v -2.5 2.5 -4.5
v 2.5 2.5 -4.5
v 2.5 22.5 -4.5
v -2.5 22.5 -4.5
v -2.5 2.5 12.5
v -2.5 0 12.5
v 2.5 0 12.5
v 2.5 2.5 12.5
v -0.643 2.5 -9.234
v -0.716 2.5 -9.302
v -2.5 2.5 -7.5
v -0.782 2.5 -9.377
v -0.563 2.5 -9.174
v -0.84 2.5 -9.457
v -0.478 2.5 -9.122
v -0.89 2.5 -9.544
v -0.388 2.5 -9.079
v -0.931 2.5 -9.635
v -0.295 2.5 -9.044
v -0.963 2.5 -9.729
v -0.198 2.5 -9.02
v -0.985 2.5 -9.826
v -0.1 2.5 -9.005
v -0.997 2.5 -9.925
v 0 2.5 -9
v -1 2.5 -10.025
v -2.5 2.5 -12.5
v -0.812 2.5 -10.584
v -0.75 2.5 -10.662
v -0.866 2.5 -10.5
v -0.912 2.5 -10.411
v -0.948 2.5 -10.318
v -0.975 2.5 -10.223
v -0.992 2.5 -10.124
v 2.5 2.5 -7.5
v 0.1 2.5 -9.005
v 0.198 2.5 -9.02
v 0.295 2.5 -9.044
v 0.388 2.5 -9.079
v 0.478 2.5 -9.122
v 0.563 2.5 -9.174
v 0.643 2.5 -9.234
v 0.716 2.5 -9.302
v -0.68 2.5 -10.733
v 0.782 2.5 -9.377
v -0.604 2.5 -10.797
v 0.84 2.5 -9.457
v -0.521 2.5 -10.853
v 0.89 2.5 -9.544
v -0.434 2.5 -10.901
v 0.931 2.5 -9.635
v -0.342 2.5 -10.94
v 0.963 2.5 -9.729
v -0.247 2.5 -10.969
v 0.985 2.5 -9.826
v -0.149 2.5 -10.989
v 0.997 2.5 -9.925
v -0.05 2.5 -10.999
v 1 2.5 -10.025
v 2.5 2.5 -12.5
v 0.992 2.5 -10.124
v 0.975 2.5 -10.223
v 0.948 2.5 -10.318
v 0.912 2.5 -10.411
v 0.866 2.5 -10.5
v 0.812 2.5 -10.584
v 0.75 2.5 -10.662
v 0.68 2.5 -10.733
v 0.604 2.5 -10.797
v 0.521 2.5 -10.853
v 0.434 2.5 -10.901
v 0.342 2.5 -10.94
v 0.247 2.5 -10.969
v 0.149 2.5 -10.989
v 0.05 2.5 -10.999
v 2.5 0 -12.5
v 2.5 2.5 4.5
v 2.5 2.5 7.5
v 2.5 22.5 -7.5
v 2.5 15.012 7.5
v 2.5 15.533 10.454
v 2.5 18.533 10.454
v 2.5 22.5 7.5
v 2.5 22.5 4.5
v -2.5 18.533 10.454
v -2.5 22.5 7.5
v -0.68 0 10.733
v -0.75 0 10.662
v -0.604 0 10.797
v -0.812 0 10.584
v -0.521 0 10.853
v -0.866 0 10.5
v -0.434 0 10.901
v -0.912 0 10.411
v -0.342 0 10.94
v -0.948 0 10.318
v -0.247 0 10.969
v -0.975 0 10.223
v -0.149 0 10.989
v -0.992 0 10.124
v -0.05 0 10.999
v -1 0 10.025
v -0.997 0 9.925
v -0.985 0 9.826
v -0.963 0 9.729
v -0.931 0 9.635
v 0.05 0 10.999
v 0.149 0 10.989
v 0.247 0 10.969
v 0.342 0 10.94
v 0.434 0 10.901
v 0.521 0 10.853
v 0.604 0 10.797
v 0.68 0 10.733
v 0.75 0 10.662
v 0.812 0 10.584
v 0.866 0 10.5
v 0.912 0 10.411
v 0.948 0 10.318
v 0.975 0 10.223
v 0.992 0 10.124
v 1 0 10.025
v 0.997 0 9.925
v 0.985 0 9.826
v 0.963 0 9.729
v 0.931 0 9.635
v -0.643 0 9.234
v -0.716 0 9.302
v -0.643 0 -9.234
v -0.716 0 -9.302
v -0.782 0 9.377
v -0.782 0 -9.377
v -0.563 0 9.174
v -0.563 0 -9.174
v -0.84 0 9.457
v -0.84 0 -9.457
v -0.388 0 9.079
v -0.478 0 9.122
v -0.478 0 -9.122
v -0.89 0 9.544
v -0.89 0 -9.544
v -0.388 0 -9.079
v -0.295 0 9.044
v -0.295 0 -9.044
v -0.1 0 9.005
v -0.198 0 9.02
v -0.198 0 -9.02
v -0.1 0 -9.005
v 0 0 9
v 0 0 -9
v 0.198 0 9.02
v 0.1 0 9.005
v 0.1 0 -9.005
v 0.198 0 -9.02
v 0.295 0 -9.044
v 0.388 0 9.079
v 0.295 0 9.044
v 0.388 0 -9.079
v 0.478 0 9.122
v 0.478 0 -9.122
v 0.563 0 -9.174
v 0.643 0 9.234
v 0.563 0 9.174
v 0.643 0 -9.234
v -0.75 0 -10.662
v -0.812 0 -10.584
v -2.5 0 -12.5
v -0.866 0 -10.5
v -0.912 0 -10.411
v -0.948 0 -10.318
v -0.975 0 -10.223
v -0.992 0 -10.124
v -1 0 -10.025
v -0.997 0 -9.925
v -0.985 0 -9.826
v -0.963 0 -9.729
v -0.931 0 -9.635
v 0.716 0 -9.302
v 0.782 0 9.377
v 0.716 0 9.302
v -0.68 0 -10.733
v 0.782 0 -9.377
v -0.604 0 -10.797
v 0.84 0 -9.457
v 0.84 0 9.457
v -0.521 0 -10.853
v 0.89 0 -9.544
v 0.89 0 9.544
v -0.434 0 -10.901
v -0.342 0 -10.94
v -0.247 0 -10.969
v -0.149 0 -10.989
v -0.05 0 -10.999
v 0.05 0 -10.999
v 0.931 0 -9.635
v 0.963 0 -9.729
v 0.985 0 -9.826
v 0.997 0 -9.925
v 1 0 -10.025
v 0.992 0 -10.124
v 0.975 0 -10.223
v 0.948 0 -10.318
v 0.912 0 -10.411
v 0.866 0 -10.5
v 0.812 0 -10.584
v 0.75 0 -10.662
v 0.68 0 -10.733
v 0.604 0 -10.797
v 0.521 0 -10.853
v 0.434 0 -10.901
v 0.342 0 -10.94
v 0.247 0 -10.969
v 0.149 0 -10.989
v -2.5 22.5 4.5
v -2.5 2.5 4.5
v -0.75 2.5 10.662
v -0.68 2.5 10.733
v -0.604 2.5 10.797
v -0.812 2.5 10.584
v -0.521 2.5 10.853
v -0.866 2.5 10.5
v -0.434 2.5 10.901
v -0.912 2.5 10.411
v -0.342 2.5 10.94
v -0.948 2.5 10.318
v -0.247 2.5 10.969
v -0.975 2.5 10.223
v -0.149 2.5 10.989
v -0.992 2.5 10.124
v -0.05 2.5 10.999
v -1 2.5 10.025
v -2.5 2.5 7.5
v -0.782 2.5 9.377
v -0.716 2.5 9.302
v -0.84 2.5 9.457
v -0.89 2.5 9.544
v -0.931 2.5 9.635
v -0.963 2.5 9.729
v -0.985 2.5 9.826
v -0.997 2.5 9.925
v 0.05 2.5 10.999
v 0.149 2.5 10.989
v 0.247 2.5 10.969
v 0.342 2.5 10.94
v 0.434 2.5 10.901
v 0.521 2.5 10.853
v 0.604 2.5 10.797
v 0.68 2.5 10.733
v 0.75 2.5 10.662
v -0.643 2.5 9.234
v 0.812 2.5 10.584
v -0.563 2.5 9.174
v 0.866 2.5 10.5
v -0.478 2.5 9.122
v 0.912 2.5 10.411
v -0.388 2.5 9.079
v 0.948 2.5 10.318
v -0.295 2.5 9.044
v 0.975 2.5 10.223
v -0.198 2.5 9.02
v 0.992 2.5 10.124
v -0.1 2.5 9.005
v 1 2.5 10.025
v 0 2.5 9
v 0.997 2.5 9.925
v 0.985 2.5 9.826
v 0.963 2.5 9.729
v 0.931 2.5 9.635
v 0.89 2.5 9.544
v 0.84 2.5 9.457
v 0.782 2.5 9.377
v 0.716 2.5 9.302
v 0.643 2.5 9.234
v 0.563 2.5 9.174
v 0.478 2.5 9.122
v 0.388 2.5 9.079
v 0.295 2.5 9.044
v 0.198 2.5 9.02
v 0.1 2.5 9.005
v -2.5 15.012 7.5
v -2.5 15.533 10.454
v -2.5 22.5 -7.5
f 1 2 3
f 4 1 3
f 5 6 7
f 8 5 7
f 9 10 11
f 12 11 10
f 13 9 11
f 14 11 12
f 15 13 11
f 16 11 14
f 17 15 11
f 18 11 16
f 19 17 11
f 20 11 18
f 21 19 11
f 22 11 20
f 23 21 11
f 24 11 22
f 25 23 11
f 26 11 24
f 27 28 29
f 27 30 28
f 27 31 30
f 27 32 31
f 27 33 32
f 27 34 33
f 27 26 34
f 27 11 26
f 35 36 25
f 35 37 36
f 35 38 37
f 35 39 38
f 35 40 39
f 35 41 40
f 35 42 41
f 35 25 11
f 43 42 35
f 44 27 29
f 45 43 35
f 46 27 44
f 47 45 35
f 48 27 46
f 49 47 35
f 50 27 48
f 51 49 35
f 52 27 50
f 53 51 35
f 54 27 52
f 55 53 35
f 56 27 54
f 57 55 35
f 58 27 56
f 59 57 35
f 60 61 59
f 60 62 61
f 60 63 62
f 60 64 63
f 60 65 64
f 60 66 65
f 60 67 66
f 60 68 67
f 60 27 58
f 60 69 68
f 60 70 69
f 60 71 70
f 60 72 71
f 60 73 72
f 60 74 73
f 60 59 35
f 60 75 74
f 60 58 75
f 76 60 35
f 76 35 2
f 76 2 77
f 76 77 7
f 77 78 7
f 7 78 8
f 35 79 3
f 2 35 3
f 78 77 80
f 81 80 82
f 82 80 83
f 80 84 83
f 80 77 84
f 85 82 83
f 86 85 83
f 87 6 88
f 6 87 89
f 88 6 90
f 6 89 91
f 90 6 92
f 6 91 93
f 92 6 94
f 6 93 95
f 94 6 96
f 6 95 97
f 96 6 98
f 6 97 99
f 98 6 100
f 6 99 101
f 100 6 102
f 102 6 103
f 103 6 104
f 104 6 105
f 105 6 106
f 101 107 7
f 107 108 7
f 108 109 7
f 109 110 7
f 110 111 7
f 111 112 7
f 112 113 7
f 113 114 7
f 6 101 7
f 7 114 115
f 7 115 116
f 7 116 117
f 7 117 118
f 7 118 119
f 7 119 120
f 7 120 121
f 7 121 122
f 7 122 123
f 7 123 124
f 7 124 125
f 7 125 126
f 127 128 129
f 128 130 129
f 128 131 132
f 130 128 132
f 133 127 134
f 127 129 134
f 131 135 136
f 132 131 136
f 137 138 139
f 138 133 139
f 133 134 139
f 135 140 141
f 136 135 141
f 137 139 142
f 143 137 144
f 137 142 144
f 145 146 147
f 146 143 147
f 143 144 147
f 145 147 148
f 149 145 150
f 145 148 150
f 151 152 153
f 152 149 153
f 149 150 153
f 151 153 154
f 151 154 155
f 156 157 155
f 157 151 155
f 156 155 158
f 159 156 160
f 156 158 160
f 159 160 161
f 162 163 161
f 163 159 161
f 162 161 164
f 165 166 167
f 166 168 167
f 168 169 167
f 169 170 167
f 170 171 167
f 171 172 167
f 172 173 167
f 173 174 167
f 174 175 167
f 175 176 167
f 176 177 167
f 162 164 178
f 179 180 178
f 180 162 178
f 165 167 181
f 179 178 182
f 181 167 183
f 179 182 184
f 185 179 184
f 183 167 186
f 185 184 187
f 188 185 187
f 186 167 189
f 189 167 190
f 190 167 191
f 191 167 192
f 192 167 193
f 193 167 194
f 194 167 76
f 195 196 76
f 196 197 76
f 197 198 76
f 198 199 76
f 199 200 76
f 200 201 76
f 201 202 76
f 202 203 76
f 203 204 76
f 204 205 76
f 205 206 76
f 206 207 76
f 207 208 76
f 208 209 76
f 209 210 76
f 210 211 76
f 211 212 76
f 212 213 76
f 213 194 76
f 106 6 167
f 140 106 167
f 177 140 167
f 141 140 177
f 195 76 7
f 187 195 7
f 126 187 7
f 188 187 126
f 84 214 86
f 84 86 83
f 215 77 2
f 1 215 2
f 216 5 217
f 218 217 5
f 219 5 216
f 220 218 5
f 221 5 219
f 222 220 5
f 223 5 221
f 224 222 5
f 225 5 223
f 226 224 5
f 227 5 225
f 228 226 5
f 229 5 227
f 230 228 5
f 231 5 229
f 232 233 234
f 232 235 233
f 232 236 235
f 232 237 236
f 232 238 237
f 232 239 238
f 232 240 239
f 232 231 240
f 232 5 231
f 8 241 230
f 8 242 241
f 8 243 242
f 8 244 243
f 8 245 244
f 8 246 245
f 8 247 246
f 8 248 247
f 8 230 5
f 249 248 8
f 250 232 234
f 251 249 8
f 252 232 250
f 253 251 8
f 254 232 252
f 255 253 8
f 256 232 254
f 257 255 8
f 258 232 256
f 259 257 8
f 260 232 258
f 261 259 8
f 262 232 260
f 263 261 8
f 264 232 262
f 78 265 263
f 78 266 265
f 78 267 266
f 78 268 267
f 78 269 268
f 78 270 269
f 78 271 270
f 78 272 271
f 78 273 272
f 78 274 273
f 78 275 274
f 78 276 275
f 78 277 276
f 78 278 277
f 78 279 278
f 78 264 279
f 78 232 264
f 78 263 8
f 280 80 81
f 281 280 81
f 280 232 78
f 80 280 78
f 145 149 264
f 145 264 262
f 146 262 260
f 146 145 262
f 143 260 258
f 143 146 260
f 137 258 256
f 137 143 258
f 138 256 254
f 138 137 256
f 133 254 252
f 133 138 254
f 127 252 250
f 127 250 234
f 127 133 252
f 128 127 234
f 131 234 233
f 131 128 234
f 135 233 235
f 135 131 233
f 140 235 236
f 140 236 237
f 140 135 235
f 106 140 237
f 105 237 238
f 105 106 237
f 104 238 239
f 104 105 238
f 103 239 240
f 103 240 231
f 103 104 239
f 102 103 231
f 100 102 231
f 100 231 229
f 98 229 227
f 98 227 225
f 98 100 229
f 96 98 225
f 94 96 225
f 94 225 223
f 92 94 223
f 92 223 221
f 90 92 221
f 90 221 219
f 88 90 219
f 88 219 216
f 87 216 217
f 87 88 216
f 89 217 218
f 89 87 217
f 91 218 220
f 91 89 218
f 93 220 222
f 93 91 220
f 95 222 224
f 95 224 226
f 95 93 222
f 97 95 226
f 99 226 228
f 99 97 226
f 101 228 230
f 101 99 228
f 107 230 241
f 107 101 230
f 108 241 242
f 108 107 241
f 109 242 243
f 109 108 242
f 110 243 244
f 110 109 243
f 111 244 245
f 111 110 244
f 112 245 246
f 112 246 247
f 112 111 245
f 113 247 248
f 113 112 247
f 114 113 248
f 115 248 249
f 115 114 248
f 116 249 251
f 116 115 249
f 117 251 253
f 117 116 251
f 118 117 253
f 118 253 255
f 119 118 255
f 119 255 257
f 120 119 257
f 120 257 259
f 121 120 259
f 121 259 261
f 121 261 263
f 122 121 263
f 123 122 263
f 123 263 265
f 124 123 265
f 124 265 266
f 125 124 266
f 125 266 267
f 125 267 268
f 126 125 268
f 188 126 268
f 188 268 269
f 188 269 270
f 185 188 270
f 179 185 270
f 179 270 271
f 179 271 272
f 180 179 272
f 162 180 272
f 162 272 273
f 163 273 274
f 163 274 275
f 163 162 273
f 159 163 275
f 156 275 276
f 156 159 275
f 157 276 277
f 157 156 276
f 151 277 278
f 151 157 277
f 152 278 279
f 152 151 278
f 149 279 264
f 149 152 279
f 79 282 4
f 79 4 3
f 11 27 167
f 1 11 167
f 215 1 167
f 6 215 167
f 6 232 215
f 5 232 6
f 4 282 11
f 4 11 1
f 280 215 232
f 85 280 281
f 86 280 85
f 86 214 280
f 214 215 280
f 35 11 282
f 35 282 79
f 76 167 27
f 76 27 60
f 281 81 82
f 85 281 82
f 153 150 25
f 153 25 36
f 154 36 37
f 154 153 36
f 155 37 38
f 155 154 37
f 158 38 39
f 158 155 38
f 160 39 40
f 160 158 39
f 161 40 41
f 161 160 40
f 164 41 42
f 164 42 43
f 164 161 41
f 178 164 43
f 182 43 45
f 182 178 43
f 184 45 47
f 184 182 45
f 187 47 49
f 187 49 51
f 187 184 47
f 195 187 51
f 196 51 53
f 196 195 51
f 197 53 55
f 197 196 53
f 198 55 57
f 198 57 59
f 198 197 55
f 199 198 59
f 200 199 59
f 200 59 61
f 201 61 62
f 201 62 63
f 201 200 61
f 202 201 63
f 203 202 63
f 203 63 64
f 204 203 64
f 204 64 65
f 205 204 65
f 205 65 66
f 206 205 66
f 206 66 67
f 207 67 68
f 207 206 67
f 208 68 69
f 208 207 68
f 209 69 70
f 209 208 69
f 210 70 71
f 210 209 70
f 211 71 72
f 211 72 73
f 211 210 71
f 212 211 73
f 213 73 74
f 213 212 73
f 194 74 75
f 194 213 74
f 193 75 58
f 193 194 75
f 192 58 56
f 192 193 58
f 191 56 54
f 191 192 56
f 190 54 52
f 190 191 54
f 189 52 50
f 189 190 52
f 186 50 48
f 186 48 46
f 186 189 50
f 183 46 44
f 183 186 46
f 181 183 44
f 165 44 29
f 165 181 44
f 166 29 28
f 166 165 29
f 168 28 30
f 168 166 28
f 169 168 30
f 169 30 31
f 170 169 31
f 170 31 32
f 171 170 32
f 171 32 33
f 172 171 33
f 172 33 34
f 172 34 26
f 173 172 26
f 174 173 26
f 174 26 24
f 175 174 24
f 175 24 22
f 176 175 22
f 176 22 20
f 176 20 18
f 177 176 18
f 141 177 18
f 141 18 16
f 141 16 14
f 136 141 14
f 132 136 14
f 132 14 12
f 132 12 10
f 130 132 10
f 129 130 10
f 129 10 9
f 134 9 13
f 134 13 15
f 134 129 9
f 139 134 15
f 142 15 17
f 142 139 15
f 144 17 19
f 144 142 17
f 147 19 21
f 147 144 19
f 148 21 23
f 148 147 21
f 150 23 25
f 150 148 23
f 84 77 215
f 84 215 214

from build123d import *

# Parameters (mm, degrees)
SKETCH_1_W          = 5
SKETCH_1_H          = 25
SKETCH_1_R          = 1
EXTRUDE_1_DEPTH     = 2.5
SKETCH_3_W          = 5
SKETCH_3_H          = 15
EXTRUDE_2_DEPTH     = 20
SKETCH_6_W          = 9
SKETCH_6_H          = 20
CUT_EXTRUDE_1_DEPTH = 27.220221204
EXTRUDE_3_DEPTH     = 5


with BuildPart() as part:
    # 草图1 → 凸台-拉伸1 (new body)
    with BuildSketch(Plane(origin=(0, 0, 0), x_dir=(1, 0, 0), z_dir=(0, 1, 0))):
        Rectangle(SKETCH_1_W, SKETCH_1_H)
        with Locations(Location((0, 10, 0), (0, 0, 270))):
            Circle(SKETCH_1_R, mode=Mode.SUBTRACT)
        with Locations(Location((0, -10, 0), (0, 0, 90))):
            Circle(SKETCH_1_R, mode=Mode.SUBTRACT)
    extrude(amount=EXTRUDE_1_DEPTH)

    # 草图3 → 凸台-拉伸2 (add)
    with BuildSketch(Plane(origin=(0, 2.5, 0), x_dir=(1, 0, 0), z_dir=(0, 1, 0))):
        Rectangle(SKETCH_3_W, SKETCH_3_H)
    extrude(amount=EXTRUDE_2_DEPTH)

    # 草图6 → 切除-拉伸1 (cut, through all)
    with BuildSketch(Plane(origin=(2.5, 0, 0), x_dir=(0, 0, -1), z_dir=(1, 0, 0))):
        with Locations((0, 12.5)):
            Rectangle(SKETCH_6_W, SKETCH_6_H)
    extrude(amount=-CUT_EXTRUDE_1_DEPTH, mode=Mode.SUBTRACT)

    # 草图5 → 凸台-拉伸3 (add)
    with BuildSketch(Plane(origin=(2.5, 0, 0), x_dir=(0, 0, -1), z_dir=(1, 0, 0))):
        Polygon((-7.5, 15.011970436), (-10.454423259, 15.532914969), (-10.454423259, 18.532914969), (-7.5, 22.5), align=None)
    extrude(amount=-EXTRUDE_3_DEPTH)


solid = part.part
